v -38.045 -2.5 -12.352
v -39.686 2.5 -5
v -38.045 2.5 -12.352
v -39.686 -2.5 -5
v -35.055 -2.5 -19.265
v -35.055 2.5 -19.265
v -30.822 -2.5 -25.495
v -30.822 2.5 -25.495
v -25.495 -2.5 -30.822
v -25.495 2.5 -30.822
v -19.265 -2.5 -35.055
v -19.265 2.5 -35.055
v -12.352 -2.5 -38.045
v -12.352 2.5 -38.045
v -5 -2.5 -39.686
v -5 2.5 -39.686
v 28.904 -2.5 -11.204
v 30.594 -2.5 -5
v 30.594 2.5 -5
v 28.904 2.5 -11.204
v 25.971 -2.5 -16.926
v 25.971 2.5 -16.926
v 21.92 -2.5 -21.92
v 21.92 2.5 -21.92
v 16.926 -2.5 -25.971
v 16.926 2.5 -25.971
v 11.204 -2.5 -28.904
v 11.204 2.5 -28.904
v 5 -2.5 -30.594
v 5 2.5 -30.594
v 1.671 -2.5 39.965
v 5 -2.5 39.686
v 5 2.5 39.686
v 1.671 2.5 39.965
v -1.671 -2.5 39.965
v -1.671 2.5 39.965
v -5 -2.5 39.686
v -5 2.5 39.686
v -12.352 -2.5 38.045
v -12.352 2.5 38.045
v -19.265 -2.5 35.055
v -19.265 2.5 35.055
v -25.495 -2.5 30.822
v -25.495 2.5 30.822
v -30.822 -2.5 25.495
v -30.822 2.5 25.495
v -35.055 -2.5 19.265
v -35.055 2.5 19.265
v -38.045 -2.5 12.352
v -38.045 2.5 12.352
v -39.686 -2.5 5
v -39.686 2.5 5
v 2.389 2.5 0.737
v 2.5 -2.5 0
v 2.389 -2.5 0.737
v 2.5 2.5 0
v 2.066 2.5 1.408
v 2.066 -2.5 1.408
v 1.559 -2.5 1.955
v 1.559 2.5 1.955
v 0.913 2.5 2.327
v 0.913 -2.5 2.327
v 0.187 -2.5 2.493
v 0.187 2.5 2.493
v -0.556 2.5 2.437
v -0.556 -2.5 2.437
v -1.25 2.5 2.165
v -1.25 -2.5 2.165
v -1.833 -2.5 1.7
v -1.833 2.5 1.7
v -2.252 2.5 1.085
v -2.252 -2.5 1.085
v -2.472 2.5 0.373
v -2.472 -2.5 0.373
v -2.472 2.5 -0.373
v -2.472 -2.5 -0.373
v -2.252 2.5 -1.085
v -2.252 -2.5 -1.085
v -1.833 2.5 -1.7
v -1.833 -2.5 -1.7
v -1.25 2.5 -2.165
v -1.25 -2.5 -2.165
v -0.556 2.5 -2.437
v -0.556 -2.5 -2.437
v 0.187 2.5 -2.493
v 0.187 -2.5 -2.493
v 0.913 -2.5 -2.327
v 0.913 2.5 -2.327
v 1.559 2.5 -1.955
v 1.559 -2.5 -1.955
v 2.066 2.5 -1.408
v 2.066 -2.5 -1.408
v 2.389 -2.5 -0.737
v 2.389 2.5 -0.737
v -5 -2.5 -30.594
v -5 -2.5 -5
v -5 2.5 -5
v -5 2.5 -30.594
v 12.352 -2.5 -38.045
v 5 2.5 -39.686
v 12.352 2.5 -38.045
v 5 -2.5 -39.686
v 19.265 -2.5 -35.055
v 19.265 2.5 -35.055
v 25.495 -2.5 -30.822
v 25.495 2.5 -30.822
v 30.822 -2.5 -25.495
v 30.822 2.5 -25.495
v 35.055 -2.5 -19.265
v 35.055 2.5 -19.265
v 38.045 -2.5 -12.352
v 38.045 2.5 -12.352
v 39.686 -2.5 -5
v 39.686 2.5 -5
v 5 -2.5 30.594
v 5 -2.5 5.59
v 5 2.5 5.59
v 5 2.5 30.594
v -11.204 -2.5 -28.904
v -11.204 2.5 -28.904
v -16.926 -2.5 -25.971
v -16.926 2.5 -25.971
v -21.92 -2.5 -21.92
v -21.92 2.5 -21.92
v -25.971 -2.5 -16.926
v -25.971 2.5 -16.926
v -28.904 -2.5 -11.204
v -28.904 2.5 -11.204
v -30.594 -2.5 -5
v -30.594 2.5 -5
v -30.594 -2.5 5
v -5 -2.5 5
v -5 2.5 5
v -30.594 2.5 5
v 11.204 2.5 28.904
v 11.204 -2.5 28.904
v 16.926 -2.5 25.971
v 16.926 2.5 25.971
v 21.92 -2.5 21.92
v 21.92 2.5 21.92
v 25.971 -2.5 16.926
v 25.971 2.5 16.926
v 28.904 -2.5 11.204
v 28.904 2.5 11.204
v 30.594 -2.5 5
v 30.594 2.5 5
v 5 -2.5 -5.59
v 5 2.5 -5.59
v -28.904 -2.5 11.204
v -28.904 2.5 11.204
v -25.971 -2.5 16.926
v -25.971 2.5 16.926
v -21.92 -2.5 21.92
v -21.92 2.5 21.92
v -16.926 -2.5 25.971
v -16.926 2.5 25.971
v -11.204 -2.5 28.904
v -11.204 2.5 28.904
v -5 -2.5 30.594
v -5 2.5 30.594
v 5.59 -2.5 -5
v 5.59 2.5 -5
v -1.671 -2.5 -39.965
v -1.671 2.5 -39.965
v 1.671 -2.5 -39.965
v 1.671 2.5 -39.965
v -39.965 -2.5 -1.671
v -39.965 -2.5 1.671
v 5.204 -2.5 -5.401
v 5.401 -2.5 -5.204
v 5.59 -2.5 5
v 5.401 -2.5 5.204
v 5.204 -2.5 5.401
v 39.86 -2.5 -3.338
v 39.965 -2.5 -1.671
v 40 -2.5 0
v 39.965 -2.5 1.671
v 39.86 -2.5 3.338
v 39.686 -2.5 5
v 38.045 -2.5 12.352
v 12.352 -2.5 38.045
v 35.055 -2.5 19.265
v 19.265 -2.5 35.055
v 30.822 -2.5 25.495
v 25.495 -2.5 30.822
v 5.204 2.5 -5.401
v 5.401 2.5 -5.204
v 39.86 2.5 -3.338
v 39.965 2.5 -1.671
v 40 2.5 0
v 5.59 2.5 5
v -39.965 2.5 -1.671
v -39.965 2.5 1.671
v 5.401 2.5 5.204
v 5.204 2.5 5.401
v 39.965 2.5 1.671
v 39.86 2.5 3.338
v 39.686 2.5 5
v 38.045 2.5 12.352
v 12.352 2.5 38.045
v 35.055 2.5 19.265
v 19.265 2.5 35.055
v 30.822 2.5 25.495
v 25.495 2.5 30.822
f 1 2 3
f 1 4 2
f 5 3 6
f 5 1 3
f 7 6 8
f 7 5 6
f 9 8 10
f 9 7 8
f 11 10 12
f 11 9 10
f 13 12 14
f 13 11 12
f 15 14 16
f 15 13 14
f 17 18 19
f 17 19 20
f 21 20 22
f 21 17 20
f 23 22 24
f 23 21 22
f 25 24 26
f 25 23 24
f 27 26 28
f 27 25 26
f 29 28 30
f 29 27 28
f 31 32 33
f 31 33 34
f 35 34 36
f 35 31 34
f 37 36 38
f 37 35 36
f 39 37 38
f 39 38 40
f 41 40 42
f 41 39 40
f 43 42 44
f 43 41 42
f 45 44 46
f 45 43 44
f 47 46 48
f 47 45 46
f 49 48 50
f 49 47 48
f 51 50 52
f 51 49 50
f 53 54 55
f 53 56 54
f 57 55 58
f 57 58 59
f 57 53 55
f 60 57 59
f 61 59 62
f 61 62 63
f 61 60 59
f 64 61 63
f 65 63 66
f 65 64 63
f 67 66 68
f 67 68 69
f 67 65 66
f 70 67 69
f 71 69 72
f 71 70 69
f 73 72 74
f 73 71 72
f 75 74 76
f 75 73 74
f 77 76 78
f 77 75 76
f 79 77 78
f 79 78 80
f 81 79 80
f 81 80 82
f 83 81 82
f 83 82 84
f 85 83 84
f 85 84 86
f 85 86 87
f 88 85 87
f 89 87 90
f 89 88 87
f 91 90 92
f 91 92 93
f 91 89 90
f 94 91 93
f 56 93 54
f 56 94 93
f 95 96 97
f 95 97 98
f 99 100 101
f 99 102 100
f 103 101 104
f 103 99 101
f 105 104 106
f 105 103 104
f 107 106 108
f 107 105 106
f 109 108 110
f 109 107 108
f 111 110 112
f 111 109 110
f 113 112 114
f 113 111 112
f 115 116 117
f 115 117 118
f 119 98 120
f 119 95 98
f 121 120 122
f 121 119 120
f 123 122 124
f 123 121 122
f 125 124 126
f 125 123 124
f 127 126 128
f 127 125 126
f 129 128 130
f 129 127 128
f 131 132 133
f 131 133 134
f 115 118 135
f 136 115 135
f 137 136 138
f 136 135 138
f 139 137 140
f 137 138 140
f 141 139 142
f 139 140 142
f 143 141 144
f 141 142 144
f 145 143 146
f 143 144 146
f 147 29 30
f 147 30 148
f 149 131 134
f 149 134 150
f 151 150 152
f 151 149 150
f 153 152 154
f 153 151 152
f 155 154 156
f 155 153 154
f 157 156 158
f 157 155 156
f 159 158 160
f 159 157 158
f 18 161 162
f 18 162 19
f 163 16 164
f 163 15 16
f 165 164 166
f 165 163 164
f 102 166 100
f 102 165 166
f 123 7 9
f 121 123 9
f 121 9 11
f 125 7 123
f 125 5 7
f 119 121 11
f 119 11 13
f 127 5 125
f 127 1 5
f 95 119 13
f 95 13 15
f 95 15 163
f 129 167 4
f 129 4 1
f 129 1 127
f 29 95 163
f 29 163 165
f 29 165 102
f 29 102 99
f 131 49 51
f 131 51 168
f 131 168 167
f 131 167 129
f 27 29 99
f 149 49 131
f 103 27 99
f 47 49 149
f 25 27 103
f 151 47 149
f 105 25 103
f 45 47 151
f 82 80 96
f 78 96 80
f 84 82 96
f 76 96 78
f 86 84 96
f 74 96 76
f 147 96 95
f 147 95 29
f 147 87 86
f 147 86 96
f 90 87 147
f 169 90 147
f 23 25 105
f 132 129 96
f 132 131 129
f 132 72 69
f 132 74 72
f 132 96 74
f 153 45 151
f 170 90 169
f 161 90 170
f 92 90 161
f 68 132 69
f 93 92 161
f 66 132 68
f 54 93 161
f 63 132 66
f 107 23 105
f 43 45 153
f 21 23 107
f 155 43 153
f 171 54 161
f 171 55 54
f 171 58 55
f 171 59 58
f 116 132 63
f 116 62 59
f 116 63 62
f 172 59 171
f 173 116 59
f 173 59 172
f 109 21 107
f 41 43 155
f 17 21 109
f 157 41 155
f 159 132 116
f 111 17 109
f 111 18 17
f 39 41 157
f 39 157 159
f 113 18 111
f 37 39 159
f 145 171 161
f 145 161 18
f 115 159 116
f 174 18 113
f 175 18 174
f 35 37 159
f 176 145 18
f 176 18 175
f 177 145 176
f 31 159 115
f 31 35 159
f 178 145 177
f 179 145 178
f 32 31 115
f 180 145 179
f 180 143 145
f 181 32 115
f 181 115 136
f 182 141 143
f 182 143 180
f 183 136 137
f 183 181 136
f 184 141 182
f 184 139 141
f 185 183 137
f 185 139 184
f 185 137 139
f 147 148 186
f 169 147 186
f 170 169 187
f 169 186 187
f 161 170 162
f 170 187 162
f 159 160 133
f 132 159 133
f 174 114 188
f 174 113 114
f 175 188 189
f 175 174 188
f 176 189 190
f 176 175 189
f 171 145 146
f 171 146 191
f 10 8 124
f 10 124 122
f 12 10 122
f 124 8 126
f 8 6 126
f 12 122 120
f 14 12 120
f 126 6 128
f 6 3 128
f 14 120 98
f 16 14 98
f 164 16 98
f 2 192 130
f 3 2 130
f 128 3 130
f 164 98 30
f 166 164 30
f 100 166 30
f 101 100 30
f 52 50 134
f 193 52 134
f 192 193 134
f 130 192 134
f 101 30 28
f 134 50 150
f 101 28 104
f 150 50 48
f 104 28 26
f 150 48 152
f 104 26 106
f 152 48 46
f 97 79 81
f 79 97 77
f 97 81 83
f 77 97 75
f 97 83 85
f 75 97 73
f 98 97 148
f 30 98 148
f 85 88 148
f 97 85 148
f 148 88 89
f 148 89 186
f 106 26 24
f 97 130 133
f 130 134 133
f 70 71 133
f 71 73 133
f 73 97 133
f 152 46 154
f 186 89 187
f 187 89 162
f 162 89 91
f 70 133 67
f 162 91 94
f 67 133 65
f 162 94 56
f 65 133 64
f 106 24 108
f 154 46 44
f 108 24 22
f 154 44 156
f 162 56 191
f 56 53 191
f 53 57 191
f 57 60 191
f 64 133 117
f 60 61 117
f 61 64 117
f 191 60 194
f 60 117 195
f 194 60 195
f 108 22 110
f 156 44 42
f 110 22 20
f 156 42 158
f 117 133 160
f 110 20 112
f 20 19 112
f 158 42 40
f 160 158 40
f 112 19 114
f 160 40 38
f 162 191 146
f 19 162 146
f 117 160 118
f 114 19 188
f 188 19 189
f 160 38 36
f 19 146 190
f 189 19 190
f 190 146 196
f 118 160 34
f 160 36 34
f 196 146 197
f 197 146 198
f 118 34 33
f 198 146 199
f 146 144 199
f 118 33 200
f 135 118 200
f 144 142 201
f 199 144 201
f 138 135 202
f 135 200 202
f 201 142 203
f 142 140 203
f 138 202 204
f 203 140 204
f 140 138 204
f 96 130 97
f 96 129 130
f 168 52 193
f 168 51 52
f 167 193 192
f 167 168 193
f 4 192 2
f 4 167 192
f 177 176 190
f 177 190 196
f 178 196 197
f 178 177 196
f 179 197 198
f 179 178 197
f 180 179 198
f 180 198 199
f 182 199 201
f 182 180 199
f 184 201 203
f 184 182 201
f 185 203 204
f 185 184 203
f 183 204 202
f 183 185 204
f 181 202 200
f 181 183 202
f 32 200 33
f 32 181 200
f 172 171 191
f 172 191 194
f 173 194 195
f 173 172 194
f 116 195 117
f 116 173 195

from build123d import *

# Parameters (mm, degrees)
F0_R     = 2.5
F1_DEPTH = 2.5


with BuildPart() as f1:
    # F0 (on Front) → F1 (new body, symmetric)
    with BuildSketch(Plane.XZ):
        with BuildLine():
            ThreePointArc((39.68627, -5), (39.92149, -2.504917), (40, 0))
            ThreePointArc((40, 0), (39.92149, 2.504917), (39.68627, 5))
            ThreePointArc((39.68627, 5), (28.284271, 28.284271), (5, 39.68627))
            ThreePointArc((5, 39.68627), (0, 40), (-5, 39.68627))
            ThreePointArc((-5, 39.68627), (-28.284271, 28.284271), (-39.68627, 5))
            ThreePointArc((-39.68627, 5), (-40, 0), (-39.68627, -5))
            ThreePointArc((-39.68627, -5), (-28.284271, -28.284271), (-5, -39.68627))
            ThreePointArc((-5, -39.68627), (0, -40), (5, -39.68627))
            ThreePointArc((5, -39.68627), (28.284271, -28.284271), (39.68627, -5))
        make_face()
        with BuildLine():
            Line((-5.59017, -5), (-5, -5))
            Line((-5, -5), (-5, -30.594117))
            ThreePointArc((-5, -30.594117), (-21.92031, -21.92031), (-30.594117, -5))
            Line((-30.594117, -5), (-5.59017, -5))
        make_face(mode=Mode.SUBTRACT)
        with BuildLine():
            Line((5, -30.594117), (5, -5.59017))
            ThreePointArc((5, -5.59017), (5.303301, -5.303301), (5.59017, -5))
            Line((5.59017, -5), (30.594117, -5))
            ThreePointArc((30.594117, -5), (21.92031, -21.92031), (5, -30.594117))
        make_face(mode=Mode.SUBTRACT)
        with BuildLine():
            Line((-5, 30.594117), (-5, 5))
            Line((-5, 5), (-30.594117, 5))
            ThreePointArc((-30.594117, 5), (-21.92031, 21.92031), (-5, 30.594117))
        make_face(mode=Mode.SUBTRACT)
        Circle(F0_R, mode=Mode.SUBTRACT)
        with BuildLine():
            ThreePointArc((5, 30.594117), (21.92031, 21.92031), (30.594117, 5))
            Line((30.594117, 5), (5.59017, 5))
            ThreePointArc((5.59017, 5), (5.303301, 5.303301), (5, 5.59017))
            Line((5, 5.59017), (5, 30.594117))
        make_face(mode=Mode.SUBTRACT)
    extrude(amount=F1_DEPTH, both=True)


solid = f1.part
